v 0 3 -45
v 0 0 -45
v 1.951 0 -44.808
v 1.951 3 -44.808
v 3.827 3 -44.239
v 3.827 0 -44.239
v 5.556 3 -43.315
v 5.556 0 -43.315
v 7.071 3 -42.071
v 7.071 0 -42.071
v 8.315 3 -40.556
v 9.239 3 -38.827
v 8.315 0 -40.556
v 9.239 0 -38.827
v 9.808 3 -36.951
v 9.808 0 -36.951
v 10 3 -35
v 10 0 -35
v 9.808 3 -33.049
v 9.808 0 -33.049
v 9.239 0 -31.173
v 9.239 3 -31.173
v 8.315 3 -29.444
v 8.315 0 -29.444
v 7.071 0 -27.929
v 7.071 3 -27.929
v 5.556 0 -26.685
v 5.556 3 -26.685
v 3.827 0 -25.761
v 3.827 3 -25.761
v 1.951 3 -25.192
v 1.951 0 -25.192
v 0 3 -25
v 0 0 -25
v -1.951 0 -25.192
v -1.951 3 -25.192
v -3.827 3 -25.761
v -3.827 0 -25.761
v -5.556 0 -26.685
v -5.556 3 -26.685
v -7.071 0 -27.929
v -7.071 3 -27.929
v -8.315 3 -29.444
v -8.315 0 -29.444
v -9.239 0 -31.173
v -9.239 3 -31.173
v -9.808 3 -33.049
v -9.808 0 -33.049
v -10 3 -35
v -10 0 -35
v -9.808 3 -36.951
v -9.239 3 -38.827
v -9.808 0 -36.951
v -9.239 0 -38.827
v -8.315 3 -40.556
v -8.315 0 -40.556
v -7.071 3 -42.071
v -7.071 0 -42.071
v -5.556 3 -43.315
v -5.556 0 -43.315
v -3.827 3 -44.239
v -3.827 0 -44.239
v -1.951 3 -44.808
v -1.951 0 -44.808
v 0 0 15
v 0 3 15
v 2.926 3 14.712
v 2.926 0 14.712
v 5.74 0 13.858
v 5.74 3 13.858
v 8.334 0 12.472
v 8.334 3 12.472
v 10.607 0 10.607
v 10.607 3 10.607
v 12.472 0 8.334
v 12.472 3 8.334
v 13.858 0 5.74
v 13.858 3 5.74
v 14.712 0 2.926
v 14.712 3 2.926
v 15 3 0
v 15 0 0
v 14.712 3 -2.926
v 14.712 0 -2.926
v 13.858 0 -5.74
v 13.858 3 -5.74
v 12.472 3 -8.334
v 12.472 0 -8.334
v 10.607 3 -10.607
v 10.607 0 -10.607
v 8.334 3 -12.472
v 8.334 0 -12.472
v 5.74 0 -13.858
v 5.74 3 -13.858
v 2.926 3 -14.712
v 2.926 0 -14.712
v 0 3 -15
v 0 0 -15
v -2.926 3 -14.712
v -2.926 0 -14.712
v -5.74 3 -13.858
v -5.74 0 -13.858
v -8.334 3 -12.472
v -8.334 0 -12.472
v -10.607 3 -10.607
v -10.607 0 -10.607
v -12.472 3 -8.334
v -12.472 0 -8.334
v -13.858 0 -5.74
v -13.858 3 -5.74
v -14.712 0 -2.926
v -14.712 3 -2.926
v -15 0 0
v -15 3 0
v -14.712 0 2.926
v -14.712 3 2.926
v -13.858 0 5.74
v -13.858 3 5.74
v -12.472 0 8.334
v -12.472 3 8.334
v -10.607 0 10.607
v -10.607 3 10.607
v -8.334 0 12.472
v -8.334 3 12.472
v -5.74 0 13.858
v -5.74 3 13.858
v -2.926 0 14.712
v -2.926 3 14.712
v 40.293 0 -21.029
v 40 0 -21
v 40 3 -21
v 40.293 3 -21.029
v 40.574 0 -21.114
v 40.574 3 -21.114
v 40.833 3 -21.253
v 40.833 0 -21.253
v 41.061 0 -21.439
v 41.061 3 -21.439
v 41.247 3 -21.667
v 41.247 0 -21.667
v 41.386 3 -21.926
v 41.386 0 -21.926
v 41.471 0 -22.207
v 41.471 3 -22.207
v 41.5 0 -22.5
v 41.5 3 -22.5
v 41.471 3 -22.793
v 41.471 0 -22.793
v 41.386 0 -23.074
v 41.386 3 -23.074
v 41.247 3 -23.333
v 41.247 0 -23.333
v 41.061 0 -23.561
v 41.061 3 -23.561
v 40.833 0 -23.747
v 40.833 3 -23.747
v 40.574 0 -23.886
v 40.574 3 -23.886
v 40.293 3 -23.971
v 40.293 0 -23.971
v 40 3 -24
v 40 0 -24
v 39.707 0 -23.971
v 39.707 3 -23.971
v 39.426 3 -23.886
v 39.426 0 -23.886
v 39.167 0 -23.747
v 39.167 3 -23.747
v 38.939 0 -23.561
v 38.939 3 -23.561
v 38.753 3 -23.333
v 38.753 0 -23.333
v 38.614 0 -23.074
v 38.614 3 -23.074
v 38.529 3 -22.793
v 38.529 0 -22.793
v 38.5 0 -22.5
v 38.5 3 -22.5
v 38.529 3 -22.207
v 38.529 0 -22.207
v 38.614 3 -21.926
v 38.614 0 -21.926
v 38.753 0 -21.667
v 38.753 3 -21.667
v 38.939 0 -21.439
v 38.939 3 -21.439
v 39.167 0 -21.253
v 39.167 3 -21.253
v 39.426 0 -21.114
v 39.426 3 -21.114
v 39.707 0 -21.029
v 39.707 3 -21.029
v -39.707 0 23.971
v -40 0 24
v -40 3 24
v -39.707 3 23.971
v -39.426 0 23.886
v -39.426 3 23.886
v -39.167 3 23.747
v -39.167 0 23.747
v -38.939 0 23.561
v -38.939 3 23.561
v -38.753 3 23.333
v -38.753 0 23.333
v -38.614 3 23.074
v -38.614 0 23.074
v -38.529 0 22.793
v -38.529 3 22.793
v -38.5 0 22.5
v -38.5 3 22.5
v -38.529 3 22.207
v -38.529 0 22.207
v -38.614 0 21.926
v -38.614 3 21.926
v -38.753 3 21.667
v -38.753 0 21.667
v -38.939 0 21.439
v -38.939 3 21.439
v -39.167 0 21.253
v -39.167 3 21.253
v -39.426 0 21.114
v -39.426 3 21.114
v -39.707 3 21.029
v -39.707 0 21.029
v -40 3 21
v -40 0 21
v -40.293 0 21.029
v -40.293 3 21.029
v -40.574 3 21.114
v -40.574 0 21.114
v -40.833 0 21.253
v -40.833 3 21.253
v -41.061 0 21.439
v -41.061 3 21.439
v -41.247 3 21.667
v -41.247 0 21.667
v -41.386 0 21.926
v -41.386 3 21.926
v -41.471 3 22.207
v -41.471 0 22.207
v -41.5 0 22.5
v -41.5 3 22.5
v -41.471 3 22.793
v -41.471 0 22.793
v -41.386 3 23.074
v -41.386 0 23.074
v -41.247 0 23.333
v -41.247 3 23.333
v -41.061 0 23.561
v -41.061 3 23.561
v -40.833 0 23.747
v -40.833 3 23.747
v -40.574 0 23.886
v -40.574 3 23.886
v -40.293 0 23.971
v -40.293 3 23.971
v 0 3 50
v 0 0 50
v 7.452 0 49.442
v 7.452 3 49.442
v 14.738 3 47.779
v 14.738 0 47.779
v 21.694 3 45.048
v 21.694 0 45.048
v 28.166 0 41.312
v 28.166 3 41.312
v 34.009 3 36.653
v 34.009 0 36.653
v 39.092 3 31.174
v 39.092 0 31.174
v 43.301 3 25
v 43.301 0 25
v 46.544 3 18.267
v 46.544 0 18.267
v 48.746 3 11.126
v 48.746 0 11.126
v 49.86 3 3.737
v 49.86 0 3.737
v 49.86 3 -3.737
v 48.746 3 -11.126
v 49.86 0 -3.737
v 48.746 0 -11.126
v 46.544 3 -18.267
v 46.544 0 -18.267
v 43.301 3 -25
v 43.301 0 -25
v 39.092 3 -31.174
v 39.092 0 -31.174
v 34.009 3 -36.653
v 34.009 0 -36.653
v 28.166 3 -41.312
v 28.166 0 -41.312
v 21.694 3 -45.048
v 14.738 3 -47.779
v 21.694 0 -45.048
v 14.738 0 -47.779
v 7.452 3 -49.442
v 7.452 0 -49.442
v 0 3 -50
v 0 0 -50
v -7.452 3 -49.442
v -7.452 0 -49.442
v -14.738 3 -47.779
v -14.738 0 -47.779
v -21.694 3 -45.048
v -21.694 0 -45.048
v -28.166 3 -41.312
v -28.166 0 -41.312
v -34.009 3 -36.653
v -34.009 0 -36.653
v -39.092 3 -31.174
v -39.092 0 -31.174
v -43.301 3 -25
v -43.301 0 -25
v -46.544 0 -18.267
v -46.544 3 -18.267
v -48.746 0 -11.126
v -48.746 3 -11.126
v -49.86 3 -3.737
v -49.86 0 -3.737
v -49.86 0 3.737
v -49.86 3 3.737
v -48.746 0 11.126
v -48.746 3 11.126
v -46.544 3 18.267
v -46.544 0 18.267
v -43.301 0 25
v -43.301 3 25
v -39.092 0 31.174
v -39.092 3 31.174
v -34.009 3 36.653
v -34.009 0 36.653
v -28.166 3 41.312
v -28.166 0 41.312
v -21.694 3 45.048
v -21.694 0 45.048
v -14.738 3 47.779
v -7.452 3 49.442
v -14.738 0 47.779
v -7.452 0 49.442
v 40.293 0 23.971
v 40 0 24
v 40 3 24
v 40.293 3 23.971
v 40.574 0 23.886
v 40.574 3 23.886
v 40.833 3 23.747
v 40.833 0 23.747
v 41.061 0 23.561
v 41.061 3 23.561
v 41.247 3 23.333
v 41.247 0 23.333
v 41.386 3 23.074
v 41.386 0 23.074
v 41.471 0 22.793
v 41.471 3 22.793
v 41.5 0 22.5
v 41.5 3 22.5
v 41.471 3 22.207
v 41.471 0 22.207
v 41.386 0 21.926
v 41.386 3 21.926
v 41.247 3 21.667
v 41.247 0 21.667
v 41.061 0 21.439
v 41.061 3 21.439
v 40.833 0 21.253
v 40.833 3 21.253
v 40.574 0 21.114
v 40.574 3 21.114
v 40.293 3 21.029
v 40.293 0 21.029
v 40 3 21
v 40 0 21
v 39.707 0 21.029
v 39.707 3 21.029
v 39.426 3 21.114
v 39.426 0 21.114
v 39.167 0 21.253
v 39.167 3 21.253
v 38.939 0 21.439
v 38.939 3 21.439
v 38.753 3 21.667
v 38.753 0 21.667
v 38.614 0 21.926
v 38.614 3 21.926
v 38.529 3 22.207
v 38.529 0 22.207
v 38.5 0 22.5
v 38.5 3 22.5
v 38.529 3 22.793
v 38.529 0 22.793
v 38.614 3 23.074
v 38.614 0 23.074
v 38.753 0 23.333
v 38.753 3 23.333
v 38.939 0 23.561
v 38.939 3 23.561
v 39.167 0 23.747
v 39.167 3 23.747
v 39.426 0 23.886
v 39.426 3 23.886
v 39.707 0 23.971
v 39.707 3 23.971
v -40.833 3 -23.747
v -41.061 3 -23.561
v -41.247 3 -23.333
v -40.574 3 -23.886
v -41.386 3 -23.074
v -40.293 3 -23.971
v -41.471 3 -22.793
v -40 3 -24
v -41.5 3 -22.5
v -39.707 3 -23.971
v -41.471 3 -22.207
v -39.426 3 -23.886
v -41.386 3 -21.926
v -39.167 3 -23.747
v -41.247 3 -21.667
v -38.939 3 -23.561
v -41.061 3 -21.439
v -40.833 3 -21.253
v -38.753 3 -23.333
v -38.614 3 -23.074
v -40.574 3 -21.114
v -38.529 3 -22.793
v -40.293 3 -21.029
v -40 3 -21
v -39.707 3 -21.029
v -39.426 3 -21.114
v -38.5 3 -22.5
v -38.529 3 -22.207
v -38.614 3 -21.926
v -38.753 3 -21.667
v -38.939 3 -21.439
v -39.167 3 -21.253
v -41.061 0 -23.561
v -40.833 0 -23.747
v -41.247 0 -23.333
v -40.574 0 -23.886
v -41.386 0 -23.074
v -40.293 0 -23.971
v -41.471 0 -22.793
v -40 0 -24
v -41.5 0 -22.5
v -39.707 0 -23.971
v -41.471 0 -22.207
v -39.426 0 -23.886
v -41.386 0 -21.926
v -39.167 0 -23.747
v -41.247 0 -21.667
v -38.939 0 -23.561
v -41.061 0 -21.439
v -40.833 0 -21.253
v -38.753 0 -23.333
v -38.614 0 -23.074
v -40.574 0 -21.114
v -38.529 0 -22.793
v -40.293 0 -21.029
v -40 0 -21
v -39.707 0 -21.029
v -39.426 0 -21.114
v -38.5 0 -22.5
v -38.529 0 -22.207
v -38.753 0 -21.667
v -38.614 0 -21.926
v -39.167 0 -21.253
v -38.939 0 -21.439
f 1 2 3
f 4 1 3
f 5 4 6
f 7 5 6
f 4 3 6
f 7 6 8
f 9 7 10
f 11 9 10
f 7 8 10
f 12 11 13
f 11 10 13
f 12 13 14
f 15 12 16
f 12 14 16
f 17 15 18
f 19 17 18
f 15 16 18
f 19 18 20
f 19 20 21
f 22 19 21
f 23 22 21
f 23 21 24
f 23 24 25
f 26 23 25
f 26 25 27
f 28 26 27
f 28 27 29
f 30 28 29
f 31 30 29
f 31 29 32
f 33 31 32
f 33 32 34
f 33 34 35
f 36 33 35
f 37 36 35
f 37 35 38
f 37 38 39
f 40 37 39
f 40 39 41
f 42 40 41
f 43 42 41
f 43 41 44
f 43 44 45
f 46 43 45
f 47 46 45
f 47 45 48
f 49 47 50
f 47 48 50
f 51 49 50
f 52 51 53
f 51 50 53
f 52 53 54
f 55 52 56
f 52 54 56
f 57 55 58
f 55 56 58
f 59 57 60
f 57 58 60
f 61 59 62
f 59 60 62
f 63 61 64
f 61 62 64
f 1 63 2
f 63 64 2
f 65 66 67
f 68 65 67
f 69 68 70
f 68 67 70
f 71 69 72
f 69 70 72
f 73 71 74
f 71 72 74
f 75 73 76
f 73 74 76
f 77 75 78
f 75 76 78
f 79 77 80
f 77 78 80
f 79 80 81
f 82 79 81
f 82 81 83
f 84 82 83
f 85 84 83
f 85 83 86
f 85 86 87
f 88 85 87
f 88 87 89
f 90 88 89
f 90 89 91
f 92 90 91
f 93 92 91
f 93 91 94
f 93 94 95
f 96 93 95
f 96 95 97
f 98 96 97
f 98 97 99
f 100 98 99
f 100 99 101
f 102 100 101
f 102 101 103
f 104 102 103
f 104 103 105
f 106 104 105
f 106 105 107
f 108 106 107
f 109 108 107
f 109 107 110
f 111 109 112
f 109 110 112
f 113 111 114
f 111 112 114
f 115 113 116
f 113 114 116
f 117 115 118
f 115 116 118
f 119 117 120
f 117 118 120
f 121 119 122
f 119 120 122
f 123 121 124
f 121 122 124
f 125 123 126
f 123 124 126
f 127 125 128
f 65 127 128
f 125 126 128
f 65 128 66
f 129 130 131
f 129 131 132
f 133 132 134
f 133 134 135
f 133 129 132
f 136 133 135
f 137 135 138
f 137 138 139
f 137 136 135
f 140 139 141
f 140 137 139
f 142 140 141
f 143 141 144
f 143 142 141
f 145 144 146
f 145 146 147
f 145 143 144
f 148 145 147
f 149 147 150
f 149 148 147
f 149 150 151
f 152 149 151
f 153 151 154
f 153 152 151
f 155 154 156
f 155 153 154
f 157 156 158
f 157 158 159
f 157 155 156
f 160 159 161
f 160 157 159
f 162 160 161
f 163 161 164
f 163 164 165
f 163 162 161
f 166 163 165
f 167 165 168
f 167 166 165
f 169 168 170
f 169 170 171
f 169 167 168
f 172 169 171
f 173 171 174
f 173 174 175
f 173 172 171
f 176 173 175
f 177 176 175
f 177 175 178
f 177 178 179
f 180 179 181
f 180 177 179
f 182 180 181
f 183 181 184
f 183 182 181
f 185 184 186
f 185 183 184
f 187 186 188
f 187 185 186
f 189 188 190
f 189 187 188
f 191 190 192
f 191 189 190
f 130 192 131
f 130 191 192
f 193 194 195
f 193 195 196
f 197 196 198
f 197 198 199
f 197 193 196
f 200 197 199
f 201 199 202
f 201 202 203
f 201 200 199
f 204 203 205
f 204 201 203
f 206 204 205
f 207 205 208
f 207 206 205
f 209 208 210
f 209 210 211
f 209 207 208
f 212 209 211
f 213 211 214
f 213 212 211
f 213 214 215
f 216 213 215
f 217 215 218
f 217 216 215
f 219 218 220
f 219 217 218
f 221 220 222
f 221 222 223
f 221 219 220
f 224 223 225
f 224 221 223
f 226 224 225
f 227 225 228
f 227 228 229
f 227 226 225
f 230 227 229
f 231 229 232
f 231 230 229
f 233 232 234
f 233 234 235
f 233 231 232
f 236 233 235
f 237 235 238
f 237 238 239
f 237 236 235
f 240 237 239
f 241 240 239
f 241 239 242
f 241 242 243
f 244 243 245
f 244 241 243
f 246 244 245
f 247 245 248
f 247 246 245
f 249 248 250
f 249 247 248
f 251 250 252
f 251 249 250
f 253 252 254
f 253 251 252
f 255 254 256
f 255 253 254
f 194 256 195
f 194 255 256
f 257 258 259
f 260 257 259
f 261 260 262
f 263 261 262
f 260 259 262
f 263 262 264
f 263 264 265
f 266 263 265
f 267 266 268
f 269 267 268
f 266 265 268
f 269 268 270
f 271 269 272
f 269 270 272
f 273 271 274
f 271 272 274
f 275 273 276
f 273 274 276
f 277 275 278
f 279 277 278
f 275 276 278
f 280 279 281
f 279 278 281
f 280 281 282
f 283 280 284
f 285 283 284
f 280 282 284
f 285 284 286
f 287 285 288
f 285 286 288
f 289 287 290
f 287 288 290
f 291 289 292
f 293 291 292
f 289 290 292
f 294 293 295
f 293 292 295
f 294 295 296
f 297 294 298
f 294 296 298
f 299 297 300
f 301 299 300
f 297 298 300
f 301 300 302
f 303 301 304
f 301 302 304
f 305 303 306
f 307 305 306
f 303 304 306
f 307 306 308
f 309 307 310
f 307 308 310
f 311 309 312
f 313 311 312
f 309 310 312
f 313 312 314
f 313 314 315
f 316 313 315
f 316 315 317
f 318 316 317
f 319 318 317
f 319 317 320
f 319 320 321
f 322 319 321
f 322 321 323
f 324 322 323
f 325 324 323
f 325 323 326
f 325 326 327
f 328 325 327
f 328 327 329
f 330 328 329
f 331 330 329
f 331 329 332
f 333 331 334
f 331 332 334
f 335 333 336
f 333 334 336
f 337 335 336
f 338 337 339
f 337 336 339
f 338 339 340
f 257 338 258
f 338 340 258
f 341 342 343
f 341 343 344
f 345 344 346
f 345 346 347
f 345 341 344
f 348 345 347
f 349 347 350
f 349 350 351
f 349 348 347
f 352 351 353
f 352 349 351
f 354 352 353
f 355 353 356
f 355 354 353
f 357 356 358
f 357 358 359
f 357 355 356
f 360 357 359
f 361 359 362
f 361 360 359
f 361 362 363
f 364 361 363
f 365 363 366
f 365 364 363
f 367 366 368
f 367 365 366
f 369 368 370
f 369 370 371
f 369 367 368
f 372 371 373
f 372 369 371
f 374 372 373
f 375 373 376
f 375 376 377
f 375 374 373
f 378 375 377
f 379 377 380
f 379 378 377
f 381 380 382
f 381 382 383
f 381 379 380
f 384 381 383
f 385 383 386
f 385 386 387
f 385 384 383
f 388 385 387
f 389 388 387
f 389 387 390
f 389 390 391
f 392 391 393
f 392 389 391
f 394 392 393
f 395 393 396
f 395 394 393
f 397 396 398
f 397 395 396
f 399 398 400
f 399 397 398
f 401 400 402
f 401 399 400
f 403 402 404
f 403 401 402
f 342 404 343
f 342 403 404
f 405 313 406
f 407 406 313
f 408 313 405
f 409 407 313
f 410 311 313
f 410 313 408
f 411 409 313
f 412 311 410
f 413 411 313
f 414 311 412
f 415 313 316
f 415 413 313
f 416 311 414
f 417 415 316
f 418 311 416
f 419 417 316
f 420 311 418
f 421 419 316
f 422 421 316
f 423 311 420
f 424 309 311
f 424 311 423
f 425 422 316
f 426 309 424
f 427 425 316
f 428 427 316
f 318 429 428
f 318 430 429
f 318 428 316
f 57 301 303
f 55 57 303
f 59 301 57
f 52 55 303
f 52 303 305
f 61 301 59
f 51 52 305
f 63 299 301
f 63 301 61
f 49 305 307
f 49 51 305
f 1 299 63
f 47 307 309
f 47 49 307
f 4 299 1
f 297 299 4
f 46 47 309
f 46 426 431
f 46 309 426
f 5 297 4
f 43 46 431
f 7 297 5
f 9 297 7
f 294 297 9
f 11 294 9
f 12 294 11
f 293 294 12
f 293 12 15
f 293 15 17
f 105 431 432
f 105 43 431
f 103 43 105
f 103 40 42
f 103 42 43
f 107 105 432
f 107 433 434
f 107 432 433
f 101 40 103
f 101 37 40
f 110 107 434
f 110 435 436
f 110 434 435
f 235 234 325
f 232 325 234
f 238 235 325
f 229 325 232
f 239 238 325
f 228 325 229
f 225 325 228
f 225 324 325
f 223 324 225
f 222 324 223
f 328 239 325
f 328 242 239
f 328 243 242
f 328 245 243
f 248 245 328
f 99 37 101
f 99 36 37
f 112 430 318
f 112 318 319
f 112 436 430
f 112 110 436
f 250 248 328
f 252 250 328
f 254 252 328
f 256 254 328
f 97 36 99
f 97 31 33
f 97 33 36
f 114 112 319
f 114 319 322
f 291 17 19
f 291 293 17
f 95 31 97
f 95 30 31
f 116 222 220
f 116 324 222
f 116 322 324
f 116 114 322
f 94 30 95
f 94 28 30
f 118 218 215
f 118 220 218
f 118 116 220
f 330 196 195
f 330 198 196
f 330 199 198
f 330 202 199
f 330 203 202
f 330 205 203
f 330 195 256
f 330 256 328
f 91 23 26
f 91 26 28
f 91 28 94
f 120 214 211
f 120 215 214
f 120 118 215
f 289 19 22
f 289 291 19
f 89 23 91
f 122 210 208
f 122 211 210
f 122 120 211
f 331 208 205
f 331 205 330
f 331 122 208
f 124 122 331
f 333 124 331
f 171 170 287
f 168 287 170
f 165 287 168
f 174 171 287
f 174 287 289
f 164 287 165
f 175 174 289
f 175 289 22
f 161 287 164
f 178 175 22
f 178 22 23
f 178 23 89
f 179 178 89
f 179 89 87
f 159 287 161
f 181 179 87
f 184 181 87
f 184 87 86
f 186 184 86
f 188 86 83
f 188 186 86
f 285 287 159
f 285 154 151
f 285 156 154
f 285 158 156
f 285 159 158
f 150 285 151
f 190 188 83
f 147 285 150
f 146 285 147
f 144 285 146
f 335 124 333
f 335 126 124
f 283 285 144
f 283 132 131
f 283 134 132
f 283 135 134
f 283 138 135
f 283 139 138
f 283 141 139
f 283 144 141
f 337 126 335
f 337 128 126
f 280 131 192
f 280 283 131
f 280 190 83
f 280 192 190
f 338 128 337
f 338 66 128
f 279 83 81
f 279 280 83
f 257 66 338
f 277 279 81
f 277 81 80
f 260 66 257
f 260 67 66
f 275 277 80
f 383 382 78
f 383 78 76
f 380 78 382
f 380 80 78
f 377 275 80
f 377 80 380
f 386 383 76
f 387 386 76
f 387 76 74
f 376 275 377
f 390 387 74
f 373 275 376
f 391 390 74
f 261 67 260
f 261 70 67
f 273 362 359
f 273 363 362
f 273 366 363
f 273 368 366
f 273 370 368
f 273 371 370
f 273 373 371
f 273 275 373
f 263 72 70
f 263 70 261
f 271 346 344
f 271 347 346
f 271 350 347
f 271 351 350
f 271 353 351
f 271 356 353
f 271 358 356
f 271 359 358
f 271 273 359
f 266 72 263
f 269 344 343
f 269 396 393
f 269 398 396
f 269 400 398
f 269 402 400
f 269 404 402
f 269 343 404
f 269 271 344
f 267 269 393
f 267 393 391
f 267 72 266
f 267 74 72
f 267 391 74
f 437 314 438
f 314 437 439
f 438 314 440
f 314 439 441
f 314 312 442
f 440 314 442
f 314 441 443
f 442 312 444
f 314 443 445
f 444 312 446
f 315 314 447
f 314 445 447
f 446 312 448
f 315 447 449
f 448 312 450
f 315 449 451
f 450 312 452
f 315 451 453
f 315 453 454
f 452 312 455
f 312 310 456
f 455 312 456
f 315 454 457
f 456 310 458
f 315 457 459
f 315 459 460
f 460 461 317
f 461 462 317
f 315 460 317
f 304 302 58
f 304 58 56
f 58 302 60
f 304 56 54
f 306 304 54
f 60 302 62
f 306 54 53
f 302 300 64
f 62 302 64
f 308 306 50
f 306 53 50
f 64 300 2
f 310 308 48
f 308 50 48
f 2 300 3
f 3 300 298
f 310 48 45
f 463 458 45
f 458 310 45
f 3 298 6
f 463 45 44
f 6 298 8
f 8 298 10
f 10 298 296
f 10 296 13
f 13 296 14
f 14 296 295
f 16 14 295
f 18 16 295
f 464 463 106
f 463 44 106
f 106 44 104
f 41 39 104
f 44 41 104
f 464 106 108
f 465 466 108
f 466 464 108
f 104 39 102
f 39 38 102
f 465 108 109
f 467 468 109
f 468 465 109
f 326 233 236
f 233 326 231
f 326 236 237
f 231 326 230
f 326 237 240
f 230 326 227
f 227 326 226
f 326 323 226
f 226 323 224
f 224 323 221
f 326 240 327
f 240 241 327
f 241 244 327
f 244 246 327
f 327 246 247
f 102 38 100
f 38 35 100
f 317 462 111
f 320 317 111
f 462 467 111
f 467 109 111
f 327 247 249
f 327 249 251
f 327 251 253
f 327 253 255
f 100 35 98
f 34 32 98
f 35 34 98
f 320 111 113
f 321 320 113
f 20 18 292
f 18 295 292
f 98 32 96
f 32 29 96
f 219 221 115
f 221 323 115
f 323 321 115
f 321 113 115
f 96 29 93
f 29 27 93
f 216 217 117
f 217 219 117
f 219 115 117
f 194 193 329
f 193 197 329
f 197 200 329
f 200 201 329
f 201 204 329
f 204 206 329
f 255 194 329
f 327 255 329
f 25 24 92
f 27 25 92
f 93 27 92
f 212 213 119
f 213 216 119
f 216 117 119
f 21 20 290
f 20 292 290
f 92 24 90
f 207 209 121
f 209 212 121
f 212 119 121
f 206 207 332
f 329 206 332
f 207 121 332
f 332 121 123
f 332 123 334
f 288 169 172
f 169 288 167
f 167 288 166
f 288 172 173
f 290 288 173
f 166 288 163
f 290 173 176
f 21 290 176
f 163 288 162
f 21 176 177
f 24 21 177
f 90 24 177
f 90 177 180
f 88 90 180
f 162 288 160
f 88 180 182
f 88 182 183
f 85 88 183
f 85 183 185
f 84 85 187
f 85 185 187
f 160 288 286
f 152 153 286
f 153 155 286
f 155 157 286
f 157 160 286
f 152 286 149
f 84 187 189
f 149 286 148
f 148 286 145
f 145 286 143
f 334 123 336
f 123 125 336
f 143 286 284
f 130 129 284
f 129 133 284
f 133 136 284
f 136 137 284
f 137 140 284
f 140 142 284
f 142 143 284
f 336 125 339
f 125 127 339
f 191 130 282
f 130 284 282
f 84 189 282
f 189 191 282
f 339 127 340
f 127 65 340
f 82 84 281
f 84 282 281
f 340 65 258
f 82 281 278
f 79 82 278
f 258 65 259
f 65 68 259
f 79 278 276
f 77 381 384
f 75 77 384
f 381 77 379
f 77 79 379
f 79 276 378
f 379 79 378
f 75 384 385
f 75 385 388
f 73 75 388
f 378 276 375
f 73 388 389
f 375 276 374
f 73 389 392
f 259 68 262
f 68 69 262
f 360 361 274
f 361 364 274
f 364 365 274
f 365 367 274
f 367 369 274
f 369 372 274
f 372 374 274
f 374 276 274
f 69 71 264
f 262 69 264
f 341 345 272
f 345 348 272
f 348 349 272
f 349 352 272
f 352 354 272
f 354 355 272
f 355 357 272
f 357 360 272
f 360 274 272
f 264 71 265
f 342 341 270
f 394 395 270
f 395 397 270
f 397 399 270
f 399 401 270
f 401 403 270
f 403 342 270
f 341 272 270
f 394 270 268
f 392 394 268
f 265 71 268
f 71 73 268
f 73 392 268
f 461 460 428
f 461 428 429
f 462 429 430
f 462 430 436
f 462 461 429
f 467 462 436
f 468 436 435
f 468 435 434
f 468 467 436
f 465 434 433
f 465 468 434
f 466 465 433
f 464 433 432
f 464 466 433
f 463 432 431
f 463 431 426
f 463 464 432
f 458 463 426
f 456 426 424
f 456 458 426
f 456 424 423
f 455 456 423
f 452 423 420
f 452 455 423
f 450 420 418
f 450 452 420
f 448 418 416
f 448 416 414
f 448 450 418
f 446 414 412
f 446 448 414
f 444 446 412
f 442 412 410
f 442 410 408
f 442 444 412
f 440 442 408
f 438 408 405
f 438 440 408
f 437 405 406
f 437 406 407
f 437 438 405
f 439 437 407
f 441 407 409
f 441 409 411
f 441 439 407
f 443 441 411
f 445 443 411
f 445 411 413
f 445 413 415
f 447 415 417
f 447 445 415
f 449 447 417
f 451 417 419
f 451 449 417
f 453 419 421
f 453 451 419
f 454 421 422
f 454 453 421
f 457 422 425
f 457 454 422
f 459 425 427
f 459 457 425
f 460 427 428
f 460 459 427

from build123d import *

# Parameters (mm, degrees)
SKETCH1_R           = 50
SKETCH1_R_2         = 1.5
BOSS_EXTRUDE1_DEPTH = 3
SKETCH2_R           = 15
CUT_EXTRUDE1_DEPTH  = 10
SKETCH3_R           = 10
CUT_EXTRUDE2_DEPTH  = 10


with BuildPart() as part:
    # Sketch1 → Boss-Extrude1 (new body)
    with BuildSketch(Plane(origin=(0, 0, 0), x_dir=(1, 0, 0), z_dir=(0, 1, 0))):
        with Locations(Location((0, 0, 0), (0, 0, 270))):
            Circle(SKETCH1_R)
        with Locations(Location((-40, 22.5, 0), (0, 0, 270))):
            Circle(SKETCH1_R_2, mode=Mode.SUBTRACT)
        with Locations(Location((40, 22.5, 0), (0, 0, 270))):
            Circle(SKETCH1_R_2, mode=Mode.SUBTRACT)
        with Locations(Location((40, -22.5, 0), (0, 0, 270))):
            Circle(SKETCH1_R_2, mode=Mode.SUBTRACT)
        with Locations(Location((-40, -22.5, 0), (0, 0, 270))):
            Circle(SKETCH1_R_2, mode=Mode.SUBTRACT)
    extrude(amount=BOSS_EXTRUDE1_DEPTH)

    # Sketch2 → Cut-Extrude1 (cut)
    with BuildSketch(Plane(origin=(0, 3, 0), x_dir=(1, 0, 0), z_dir=(0, 1, 0))):
        with Locations(Location((0, 0, 0), (0, 0, 270))):
            Circle(SKETCH2_R)
    extrude(amount=-CUT_EXTRUDE1_DEPTH, mode=Mode.SUBTRACT)

    # Sketch3 → Cut-Extrude2 (cut)
    with BuildSketch(Plane.XZ):
        with Locations(Location((0, -35, 0), (0, 0, 270))):
            Circle(SKETCH3_R)
    extrude(amount=-CUT_EXTRUDE2_DEPTH, mode=Mode.SUBTRACT)


solid = part.part
